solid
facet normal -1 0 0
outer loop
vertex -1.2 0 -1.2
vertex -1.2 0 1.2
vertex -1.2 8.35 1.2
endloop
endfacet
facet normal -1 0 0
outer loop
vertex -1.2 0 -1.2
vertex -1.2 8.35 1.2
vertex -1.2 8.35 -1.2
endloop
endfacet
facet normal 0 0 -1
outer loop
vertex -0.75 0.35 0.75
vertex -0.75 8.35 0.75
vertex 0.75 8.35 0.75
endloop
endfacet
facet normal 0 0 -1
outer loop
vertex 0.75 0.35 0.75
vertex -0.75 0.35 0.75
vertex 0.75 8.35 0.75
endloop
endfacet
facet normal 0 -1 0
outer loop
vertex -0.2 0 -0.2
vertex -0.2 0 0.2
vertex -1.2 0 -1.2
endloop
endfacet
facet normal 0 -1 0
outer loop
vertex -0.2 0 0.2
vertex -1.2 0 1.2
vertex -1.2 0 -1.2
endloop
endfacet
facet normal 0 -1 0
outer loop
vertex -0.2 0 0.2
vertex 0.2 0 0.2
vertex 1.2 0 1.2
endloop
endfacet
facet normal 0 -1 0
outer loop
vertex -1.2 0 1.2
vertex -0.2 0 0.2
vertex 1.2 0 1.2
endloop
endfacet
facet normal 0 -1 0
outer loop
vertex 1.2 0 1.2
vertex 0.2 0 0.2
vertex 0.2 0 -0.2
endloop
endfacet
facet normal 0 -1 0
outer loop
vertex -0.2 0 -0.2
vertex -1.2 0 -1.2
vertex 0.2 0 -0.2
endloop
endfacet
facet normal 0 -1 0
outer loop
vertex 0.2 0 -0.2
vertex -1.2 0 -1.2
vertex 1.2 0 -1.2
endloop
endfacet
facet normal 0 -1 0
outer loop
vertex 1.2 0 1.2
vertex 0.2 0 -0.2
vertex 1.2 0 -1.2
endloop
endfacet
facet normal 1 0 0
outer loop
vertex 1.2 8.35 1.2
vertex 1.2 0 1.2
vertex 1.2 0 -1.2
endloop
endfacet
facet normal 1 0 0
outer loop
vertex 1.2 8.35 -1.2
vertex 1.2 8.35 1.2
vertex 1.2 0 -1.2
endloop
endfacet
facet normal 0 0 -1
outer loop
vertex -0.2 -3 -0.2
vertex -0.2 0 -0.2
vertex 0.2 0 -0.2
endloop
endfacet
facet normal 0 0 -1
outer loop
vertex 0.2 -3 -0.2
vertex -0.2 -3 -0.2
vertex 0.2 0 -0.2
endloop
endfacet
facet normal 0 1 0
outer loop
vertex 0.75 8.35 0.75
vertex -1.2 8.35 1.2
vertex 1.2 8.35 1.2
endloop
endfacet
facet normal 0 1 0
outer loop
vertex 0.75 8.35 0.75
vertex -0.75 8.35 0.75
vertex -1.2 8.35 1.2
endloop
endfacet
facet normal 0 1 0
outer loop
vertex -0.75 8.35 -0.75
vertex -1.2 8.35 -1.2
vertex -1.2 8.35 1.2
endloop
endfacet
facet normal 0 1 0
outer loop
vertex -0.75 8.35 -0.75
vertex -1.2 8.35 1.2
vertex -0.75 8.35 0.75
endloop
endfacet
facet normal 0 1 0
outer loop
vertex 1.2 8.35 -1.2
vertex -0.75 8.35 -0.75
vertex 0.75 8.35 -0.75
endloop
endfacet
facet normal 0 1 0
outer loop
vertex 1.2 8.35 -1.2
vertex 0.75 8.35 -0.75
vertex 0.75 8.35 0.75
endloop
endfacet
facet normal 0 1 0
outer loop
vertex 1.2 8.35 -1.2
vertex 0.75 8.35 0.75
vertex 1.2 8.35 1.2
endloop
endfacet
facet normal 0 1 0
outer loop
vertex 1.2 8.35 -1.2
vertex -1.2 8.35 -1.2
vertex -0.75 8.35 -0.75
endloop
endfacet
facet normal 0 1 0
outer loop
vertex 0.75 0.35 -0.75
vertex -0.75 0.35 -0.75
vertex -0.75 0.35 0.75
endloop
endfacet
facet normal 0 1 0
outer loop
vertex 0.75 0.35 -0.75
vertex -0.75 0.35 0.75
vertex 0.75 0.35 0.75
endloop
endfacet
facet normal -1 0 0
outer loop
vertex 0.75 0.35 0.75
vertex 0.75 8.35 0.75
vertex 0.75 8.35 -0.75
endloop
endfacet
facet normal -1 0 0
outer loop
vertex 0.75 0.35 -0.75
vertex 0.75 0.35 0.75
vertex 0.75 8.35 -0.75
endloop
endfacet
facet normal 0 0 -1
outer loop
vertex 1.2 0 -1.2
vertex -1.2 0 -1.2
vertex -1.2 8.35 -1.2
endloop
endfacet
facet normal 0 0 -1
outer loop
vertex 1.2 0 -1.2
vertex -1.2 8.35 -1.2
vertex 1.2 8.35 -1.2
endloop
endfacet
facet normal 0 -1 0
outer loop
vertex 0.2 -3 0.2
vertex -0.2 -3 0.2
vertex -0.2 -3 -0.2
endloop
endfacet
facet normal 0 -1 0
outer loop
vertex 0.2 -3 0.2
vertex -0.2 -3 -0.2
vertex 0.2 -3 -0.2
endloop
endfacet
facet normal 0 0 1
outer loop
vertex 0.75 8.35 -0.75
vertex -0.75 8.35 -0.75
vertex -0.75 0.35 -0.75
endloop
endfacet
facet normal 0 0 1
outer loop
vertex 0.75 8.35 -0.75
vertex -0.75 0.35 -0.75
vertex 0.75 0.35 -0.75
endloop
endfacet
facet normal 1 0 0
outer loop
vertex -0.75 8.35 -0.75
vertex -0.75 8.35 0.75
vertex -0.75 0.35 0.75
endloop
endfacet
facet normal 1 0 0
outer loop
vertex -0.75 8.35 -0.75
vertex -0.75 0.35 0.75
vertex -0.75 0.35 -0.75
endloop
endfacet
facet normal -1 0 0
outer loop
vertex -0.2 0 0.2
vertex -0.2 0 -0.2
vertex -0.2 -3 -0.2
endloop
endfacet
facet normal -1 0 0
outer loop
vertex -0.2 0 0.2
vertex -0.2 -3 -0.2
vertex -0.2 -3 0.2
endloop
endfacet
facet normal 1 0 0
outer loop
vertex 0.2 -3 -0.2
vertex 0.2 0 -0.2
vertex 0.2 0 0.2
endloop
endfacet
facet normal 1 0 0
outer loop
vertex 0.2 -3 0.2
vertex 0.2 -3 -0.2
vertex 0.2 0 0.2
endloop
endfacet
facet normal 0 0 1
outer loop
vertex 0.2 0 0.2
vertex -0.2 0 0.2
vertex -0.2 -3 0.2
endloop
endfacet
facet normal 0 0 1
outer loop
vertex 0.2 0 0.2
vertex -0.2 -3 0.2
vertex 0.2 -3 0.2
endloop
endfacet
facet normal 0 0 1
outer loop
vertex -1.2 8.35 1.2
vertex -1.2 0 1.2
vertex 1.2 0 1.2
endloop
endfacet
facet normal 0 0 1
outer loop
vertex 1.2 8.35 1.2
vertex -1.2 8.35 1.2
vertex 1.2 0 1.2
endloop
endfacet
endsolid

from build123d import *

# Parameters (mm, degrees)
SKETCH1_W           = 2.4
SKETCH1_H           = 2.4
BOSS_EXTRUDE1_DEPTH = 8.35
SKETCH2_W           = 1.5
SKETCH2_H           = 1.5
CUT_EXTRUDE1_DEPTH  = 8
SKETCH3_W           = 0.4
SKETCH3_H           = 0.4
BOSS_EXTRUDE2_DEPTH = 3


with BuildPart() as part:
    # Sketch1 → Boss-Extrude1 (new body)
    with BuildSketch(Plane(origin=(0, 0, 0), x_dir=(1, 0, 0), z_dir=(0, 1, 0))):
        Rectangle(SKETCH1_W, SKETCH1_H)
    extrude(amount=BOSS_EXTRUDE1_DEPTH)

    # Sketch2 → Cut-Extrude1 (cut)
    with BuildSketch(Plane(origin=(0, 8.35, 0), x_dir=(1, 0, 0), z_dir=(0, 1, 0))):
        Rectangle(SKETCH2_W, SKETCH2_H)
    extrude(amount=-CUT_EXTRUDE1_DEPTH, mode=Mode.SUBTRACT)

    # Sketch3 → Boss-Extrude2 (add)
    with BuildSketch(Plane.XZ):
        Rectangle(SKETCH3_W, SKETCH3_H)
    extrude(amount=BOSS_EXTRUDE2_DEPTH)


solid = part.part
